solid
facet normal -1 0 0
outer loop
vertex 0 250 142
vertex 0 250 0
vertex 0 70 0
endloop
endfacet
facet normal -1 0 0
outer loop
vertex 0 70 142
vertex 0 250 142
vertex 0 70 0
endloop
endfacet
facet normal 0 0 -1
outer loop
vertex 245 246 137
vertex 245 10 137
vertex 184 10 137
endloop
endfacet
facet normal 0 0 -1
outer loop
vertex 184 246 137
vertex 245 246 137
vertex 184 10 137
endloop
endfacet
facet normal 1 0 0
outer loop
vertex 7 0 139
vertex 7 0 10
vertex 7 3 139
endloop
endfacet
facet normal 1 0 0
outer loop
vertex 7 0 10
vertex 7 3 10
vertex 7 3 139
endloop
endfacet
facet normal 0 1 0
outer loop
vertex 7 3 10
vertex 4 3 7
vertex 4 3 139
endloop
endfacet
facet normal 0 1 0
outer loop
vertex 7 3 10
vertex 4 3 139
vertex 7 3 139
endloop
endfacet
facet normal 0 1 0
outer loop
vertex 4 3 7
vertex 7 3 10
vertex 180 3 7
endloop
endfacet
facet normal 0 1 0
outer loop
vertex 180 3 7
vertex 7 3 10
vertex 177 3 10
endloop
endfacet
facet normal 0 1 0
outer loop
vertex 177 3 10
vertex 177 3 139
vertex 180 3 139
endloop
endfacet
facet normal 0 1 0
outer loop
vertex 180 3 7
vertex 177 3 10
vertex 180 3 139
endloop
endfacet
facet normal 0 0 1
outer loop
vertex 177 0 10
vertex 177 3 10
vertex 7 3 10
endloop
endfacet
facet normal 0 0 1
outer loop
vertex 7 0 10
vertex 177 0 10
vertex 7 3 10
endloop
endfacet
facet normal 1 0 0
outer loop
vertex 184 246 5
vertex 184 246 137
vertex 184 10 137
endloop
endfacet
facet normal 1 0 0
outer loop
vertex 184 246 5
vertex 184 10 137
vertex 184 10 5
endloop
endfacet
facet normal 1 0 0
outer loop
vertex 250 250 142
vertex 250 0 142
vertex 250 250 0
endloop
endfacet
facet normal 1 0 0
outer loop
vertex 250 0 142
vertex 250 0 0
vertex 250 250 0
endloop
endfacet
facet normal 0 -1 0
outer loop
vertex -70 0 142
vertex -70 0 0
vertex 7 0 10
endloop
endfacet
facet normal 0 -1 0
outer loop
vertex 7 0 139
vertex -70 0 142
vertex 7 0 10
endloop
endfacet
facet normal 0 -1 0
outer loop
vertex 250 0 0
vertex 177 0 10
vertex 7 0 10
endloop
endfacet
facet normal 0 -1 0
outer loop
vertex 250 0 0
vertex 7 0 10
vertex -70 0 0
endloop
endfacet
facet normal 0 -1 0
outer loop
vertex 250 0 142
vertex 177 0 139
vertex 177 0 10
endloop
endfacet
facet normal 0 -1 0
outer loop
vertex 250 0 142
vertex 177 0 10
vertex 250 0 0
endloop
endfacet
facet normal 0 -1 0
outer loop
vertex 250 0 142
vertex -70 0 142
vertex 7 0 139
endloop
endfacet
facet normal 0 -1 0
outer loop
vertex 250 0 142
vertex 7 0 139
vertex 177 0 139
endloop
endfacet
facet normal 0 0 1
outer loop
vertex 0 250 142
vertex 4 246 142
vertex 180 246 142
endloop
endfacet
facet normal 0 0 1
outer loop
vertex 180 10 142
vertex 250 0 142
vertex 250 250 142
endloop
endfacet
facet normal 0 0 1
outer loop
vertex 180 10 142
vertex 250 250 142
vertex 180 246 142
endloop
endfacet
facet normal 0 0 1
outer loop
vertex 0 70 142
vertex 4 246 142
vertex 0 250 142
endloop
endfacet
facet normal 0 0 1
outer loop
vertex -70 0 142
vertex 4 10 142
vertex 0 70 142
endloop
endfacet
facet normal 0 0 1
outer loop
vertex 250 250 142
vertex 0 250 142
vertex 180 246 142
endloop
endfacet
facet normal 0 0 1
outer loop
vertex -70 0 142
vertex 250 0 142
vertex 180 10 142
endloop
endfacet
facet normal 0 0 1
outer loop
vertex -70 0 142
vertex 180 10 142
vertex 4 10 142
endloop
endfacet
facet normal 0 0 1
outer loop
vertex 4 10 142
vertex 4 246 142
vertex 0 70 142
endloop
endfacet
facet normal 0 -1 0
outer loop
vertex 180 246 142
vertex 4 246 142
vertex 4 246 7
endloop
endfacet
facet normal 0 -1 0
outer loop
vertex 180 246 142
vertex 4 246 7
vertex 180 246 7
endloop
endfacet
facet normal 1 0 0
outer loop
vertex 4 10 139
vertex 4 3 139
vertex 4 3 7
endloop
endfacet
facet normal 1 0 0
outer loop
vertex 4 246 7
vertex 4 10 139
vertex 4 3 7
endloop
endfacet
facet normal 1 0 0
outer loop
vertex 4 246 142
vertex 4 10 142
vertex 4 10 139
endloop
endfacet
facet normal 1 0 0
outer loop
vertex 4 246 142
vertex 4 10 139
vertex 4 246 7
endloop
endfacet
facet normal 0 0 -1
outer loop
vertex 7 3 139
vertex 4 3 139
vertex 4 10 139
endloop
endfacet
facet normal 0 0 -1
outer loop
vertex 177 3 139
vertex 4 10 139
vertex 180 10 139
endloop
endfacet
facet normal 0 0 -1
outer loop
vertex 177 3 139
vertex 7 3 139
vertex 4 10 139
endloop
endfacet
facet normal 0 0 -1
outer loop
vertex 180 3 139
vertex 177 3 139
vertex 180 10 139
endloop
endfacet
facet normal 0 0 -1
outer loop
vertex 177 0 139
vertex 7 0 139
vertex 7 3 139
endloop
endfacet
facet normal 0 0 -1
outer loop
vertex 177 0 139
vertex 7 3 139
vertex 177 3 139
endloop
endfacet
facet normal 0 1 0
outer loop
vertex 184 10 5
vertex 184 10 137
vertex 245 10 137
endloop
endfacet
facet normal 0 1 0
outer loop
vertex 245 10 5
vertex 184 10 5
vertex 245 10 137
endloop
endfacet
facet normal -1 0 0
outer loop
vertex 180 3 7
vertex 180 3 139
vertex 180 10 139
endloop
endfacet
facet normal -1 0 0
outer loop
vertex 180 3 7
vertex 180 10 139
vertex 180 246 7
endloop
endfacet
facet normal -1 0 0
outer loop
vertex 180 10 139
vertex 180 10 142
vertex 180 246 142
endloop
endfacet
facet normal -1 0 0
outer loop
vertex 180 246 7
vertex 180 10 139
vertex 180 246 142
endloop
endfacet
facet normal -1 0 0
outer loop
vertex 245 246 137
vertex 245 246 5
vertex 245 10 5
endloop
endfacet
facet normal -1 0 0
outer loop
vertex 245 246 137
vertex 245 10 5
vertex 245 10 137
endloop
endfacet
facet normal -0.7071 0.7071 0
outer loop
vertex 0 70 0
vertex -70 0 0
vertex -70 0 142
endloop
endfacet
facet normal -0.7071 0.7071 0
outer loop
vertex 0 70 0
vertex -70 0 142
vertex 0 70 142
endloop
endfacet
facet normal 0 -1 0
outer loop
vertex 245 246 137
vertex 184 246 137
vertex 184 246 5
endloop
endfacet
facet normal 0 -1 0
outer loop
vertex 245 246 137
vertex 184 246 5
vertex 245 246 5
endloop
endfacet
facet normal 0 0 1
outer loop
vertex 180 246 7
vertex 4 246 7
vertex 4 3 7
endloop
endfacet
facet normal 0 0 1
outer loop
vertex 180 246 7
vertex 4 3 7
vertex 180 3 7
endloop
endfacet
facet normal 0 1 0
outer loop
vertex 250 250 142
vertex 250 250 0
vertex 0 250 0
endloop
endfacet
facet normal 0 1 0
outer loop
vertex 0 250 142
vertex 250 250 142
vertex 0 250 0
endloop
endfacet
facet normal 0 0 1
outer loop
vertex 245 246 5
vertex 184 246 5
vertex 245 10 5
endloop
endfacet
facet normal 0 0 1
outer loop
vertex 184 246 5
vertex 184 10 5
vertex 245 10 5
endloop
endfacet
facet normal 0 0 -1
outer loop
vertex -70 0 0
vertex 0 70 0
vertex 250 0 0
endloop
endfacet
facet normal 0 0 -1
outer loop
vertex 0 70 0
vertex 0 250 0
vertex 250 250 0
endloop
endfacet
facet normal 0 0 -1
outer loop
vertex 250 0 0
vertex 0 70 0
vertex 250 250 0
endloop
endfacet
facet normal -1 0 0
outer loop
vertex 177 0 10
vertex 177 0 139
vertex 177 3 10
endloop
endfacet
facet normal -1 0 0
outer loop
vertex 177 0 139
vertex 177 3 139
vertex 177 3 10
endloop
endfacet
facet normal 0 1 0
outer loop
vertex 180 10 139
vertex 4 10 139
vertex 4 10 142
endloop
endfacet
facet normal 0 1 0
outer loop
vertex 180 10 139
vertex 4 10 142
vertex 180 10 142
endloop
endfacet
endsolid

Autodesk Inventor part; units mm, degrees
ref_plane "YZ Plane" through (0, 0, 0) normal (1, 0, 0) x (0, 1, 0)
ref_plane "XZ Plane" through (0, 0, 0) normal (0, 1, 0) x (-1, 0, 0)
ref_plane "XY Plane" through (0, 0, 0) normal (0, 0, 1) x (1, 0, 0)
sketch "Sketch1" plane through (0, 0, 0) normal (0, 0, 1) x (1, 0, 0)
  point P0 (0, 0)
sketch "Sketch2" plane through (0, 0, 0) normal (0, 0, 1) x (1, 0, 0)
  line L0 (0, 0) -> (250, 0)
  line L1 (250, 0) -> (250, 250)
  line L2 (250, 250) -> (0, 250)
  line L3 (0, 250) -> (0, 0)
  line L4 (0, 0) -> (-70, 0)
  line L5 (-70, 0) -> (0, 70)
  dimension "d0" = 250
  dimension "d1" = 250
  dimension "d2" = 70
  dimension "d3" = 45
extrude "Extrusion1" add sketch "Sketch2" along normal blind 142
sketch "Sketch3" plane through (0, 0, 142) normal (0, 0, 1) x (1, 0, 0)
  line L0 (4, 3) -> (180, 3)
  line L1 (-70, 0) -> (250, 0) projected
  line L2 (4, 3) -> (180, 3) construction
  line L3 (180, 3) -> (180, 246)
  line L4 (4, 3) -> (4, 246)
  line L5 (4, 3) -> (247, 3) construction
  line L6 (250, 250) -> (0, 250) projected
  line L7 (4, 246) -> (180, 246)
  point P0 (0, 0)
  dimension "d6" = 176
  dimension "d7" = 0
  dimension "d8" = 243
  dimension "d9" = 243
  dimension "d10" = 90
extrude "Extrusion2" cut sketch "Sketch3" against normal blind 135
sketch "Sketch4" plane through (4, 3, 142) normal (0, 1, 0) x (1, 0, 0)
  line L0 (3, 3) -> (173, 3)
  line L1 (176, 0) -> (0, 0) projected
  line L2 (173, 3) -> (173, 132)
  line L3 (173, 132) -> (3, 132)
  line L4 (176, 135) -> (0, 135) projected
  line L5 (3, 132) -> (3, 3)
  line L6 (176, 0) -> (176, 135) projected
  line L7 (0, 0) -> (0, 135) projected
  point P0 (-4, 142)
  dimension "d13" = 3
  dimension "d14" = 3
  dimension "d15" = 3
  dimension "d16" = 3
extrude "Extrusion3" cut sketch "Sketch4" against normal through all contours L5 L3 L2 L0
sketch "Sketch5" plane through (4, 3, 142) normal (0, 1, 0) x (1, 0, 0)
  line L0 (176, 0) -> (0, 0) projected
  line L1 (0, 0) -> (0, 3)
  line L2 (3, 3) -> (3, 132) projected
  line L3 (0, 3) -> (176, 3)
  line L4 (176, 0) -> (176, 135) projected
  line L5 (176, 0) -> (0, 0)
  line L6 (3, 3) -> (173, 3) projected
  point P0 (-4, 142)
extrude "Extrusion4" add sketch "Sketch5" along normal blind 7
sketch "Sketch6" plane through (-70, 0, 0) normal (0, -1, 0) x (1, 0, 0)
  line L0 (315, 137) -> (254, 137)
  line L1 (254, 137) -> (254, 5)
  line L2 (254, 5) -> (315, 5)
  line L3 (315, 5) -> (315, 137)
  line L4 (0, 142) -> (320, 142) projected
  line L5 (0, 0) -> (320, 0) projected
  line L6 (320, 0) -> (320, 142) projected
  line L7 (247, 139) -> (247, 10) projected
  point P0 (70, 0)
  dimension "d21" = 5
  dimension "d22" = 5
  dimension "d23" = 5
  dimension "d24" = 7
extrude "Extrusion5" cut sketch "Sketch6" against normal blind 246
sketch "Sketch7" plane through (-70, 0, 0) normal (0, -1, 0) x (1, 0, 0)
  line L0 (254, 5) -> (254, 137) projected
  line L1 (315, 137) -> (315, 5) projected
  line L2 (254, 137) -> (315, 137)
  line L3 (315, 137) -> (315, 5)
  line L4 (315, 5) -> (254, 5)
  line L5 (254, 5) -> (254, 137)
  point P0 (70, 0)
  point P1 (315, 5)
extrude "Extrusion6" add sketch "Sketch7" against normal blind 10
properties part number "Body_updated"
